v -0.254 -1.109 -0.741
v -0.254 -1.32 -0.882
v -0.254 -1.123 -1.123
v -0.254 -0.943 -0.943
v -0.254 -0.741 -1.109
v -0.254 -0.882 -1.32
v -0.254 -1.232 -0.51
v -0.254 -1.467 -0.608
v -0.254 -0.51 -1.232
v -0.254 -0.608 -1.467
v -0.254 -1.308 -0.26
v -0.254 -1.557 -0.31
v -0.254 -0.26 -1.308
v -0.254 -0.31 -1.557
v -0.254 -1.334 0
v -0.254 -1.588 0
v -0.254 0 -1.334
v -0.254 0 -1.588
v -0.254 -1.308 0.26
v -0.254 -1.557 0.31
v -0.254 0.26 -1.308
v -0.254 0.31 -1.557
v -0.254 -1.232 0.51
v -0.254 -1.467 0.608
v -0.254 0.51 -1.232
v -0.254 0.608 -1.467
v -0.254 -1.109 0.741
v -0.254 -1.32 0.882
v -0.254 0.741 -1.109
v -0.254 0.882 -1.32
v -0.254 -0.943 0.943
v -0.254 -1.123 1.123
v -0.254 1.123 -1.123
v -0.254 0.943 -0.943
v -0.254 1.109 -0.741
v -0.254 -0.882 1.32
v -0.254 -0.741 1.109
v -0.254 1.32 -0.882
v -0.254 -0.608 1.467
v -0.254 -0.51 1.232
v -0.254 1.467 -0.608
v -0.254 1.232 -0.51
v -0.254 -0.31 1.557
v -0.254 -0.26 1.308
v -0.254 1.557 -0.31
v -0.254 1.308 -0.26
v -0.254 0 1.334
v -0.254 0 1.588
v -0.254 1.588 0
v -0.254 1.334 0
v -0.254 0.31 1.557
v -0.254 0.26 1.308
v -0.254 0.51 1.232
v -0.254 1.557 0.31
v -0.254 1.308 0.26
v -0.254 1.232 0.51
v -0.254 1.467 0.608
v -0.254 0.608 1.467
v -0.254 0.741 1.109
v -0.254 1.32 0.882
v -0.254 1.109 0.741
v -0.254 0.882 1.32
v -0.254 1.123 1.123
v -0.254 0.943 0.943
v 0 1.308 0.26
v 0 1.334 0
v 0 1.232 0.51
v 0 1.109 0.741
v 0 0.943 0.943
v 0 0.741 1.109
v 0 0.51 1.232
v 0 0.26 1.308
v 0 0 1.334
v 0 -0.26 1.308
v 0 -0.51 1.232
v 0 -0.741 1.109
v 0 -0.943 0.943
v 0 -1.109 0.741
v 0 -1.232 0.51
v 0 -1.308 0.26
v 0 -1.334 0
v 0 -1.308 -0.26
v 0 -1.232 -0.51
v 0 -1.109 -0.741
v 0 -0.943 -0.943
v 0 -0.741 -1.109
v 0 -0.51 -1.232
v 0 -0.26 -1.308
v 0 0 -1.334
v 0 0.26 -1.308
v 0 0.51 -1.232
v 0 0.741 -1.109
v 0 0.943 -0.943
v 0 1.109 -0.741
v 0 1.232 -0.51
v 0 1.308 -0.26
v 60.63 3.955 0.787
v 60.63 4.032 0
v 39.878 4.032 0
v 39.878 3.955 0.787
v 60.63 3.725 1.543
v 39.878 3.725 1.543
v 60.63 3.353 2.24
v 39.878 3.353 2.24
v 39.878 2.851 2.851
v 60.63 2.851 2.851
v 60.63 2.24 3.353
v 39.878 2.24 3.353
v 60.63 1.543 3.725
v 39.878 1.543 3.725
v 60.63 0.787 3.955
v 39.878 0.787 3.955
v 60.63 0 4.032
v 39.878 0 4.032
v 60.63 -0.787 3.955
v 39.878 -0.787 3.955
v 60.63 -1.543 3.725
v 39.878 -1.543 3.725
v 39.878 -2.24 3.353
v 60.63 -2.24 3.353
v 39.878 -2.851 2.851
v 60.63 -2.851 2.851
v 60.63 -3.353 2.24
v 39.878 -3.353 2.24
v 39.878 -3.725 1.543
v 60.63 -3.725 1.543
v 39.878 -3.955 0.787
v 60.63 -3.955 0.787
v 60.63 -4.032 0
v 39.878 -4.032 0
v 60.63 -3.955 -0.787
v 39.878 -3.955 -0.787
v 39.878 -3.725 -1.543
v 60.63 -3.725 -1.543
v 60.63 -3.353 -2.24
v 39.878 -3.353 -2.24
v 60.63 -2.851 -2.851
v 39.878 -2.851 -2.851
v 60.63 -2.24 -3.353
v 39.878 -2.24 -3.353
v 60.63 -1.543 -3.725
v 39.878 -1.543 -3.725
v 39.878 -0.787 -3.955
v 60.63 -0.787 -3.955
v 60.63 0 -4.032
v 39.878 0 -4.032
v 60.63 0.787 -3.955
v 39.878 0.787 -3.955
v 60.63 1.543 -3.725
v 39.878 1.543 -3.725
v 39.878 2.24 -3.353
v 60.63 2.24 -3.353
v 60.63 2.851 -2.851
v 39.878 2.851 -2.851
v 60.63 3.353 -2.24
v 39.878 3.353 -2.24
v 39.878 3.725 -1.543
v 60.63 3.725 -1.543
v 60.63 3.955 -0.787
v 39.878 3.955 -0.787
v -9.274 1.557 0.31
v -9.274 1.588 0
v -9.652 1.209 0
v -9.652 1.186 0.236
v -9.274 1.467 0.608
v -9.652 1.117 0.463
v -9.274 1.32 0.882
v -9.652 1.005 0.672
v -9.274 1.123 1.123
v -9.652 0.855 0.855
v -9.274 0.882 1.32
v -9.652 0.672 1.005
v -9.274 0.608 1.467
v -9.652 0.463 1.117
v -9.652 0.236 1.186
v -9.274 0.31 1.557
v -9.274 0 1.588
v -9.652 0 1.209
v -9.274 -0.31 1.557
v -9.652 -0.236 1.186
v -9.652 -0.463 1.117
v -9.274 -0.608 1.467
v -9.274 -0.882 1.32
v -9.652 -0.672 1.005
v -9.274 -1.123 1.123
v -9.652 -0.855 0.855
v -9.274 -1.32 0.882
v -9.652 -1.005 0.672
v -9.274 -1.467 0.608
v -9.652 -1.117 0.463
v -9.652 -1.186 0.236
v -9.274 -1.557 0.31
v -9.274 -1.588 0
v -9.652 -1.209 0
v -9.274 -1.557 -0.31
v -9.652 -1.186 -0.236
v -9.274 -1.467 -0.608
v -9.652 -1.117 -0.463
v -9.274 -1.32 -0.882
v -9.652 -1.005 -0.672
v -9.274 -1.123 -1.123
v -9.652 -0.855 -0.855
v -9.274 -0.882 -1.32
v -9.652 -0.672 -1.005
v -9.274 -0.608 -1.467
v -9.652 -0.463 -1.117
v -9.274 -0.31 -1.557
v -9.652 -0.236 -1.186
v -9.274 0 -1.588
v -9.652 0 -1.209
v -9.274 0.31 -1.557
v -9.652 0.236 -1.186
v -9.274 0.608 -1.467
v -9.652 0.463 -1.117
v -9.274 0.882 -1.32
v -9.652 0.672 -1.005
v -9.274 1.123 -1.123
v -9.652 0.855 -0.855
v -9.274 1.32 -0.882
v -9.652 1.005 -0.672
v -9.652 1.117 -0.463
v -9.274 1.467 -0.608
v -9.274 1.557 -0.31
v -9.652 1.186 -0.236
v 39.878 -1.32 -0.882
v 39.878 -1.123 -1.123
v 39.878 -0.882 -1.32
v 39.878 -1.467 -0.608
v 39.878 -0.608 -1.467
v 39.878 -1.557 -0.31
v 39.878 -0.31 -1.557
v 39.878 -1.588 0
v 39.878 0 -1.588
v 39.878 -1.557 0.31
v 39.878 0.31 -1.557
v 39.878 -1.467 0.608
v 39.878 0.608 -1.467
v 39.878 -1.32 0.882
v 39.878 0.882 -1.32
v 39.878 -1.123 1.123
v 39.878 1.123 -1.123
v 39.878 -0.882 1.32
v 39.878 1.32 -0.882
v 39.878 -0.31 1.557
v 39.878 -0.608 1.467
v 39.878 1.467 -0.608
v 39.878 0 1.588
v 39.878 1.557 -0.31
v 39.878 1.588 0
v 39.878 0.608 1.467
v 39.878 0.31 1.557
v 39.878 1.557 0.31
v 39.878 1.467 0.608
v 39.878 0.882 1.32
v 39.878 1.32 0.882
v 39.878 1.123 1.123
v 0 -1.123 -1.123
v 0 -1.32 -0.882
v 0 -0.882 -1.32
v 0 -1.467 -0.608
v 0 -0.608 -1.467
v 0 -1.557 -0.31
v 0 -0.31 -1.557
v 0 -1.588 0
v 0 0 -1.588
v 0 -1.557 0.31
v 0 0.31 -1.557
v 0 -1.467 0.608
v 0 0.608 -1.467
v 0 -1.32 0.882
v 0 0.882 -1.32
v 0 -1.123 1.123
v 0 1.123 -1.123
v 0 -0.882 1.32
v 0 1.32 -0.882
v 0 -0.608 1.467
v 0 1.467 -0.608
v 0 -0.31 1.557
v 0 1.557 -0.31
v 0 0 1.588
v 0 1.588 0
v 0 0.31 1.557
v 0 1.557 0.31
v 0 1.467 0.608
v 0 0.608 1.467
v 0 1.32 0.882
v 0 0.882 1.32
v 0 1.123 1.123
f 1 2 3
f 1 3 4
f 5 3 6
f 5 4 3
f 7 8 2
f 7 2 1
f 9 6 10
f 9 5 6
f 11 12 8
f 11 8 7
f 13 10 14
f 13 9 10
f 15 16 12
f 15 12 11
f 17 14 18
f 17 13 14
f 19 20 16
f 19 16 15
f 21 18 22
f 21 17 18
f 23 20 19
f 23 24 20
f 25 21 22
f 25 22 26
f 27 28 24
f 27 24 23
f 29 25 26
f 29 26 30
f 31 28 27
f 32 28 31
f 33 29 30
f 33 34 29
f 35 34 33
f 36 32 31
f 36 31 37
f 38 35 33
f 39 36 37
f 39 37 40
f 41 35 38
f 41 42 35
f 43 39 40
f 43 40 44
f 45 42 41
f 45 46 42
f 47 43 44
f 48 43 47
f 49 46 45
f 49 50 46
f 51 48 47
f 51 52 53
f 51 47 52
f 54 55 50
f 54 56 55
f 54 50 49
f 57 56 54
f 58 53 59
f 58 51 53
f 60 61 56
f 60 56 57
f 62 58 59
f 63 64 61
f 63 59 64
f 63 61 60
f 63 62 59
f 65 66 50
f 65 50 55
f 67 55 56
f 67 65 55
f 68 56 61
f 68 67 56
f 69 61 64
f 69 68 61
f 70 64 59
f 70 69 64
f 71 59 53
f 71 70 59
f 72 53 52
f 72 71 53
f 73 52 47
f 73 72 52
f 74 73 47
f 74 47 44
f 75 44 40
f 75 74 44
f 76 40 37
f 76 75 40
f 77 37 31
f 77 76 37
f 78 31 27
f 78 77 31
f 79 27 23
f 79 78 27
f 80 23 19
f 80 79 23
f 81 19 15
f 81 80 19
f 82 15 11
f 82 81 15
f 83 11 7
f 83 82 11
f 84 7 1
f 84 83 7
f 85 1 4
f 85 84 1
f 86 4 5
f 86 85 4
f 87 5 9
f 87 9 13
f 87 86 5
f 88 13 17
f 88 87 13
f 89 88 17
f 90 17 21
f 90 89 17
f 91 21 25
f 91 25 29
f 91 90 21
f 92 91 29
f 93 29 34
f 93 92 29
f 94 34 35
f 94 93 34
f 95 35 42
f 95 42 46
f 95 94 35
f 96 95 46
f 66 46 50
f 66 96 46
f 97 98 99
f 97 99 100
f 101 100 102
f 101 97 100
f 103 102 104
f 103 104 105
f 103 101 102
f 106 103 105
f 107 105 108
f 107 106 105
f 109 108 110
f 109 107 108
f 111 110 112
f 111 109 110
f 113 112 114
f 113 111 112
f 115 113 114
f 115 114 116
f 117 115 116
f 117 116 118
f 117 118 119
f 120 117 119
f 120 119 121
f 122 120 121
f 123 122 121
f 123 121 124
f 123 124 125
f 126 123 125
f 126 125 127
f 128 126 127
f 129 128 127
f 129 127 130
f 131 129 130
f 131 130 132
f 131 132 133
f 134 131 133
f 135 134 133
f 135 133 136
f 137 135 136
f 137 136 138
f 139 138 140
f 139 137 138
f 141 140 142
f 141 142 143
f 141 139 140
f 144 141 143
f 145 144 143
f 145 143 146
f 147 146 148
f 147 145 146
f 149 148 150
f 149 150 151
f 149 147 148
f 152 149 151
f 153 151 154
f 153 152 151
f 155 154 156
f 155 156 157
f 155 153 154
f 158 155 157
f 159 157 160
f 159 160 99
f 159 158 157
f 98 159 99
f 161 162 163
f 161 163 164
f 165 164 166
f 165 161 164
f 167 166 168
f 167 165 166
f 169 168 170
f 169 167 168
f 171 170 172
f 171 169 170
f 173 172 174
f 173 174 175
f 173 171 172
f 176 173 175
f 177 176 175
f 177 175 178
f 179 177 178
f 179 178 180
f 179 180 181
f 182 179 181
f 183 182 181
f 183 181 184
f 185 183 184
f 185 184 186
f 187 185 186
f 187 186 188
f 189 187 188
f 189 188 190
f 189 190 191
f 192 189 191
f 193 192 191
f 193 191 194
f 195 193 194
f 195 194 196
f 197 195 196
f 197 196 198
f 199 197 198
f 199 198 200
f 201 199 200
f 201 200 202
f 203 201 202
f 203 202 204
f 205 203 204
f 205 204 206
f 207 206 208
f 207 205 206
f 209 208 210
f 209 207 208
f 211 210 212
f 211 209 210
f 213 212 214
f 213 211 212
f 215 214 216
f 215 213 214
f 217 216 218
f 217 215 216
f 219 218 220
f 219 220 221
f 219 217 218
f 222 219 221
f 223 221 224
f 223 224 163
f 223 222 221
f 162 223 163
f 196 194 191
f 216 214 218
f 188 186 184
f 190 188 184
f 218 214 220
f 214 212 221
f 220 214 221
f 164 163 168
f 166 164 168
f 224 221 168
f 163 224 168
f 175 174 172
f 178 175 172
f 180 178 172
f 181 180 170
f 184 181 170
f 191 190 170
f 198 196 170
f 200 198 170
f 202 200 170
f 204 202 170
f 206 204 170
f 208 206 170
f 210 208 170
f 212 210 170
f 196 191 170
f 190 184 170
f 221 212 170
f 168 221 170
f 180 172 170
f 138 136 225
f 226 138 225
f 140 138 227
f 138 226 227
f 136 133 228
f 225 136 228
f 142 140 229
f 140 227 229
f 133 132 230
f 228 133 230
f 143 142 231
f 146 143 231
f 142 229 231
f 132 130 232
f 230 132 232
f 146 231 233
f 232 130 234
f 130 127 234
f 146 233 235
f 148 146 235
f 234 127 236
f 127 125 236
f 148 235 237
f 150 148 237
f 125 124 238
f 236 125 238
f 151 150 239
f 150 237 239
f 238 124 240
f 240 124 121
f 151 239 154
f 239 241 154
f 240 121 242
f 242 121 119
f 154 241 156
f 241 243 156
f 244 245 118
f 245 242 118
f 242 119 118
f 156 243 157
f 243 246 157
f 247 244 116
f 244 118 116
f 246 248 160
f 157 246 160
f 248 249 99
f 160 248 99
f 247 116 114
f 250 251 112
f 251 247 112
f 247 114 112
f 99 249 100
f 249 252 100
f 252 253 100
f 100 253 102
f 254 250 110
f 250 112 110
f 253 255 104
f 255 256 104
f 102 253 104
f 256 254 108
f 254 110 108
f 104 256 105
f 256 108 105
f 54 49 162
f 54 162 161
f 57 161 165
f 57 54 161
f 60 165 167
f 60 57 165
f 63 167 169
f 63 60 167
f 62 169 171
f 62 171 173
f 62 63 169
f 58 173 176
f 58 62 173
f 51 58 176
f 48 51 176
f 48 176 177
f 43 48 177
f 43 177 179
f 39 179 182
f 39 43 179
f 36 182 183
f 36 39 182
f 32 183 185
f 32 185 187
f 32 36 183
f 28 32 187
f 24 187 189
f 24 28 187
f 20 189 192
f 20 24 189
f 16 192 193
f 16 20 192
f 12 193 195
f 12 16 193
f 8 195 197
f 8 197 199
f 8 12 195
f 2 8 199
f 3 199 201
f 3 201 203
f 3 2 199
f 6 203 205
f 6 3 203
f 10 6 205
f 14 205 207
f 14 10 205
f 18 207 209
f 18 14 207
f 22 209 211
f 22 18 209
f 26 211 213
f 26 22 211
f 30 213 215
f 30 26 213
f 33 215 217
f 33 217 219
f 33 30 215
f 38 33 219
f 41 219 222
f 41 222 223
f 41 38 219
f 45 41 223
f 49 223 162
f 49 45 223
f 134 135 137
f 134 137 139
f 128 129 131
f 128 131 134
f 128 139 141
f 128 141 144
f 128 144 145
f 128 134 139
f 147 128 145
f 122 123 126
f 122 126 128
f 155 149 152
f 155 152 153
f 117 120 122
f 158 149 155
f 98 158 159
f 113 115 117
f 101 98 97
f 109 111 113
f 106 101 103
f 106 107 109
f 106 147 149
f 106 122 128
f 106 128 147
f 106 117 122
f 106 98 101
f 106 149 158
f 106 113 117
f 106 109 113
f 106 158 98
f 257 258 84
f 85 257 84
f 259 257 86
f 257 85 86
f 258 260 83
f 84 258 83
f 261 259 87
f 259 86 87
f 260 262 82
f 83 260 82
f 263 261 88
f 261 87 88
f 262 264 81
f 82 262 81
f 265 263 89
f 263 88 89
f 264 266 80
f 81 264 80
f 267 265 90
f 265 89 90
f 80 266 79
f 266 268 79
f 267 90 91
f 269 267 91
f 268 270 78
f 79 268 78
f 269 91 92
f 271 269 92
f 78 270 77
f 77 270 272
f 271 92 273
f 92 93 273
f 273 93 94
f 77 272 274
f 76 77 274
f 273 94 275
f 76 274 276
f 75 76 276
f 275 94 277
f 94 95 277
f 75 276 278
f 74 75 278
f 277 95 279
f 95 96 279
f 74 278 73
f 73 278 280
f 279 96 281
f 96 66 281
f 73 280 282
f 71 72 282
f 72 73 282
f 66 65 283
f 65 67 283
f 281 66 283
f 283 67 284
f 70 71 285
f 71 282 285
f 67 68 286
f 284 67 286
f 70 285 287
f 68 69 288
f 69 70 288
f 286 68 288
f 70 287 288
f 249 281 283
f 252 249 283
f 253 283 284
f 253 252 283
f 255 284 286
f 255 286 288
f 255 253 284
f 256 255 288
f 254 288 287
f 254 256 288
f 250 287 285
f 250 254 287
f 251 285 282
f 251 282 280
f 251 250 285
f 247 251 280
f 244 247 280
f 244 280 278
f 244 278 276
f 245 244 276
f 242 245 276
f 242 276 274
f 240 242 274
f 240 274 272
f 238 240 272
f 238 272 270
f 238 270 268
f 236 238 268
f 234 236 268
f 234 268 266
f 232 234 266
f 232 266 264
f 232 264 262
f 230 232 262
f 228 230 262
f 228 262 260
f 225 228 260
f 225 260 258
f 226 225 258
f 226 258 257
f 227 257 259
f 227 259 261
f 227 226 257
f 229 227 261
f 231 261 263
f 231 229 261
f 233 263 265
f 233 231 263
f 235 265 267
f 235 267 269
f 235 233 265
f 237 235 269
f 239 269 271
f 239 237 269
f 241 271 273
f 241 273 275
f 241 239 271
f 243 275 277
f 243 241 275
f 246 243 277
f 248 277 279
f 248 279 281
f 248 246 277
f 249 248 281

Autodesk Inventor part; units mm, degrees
sketch "Sketch_1" plane through (0, 0, 0) normal (0, 0, 1) x (1, 0, 0)
  line L0 (60.6298, 0) -> (0, 0)
  line L1 (0, 0) -> (0, 1.5875)
  line L2 (0, 1.5875) -> (39.878, 1.5875)
  line L3 (39.878, 1.5875) -> (39.878, 4.0323)
  line L4 (39.878, 4.0323) -> (60.6298, 4.0323)
  line L5 (60.6298, 4.0323) -> (60.6298, 0)
  line L6 (60.6298, 0) -> (0, 0)
revolve "Revolution1" add sketch "Sketch_1" angle 360 about axis through (60.6298, 0, 0) along (1, 0, 0)
sketch "Sketch_2" plane through (0, 0, 0) normal (0, 0, 1) x (1, 0, 0)
  line L0 (0, 0) -> (-9.652, 0)
  line L1 (-9.652, 0) -> (-9.652, 1.209)
  line L2 (-9.652, 1.209) -> (-9.2735, 1.5875)
  line L3 (-9.2735, 1.5875) -> (0, 1.5875)
  line L4 (0, 1.5875) -> (0, 0)
  line L5 (0, 0) -> (-9.652, 0)
revolve "Revolution2" add sketch "Sketch_2" angle 360 about axis through (0, 0, 0) along (1, 0, 0)
sketch "Sketch_30" plane through (0, 0, 0) normal (0, 0, 1) x (1, 0, 0)
  line L0 (0, 0) -> (-0.254, 0)
  line L1 (-0.254, 1.3335) -> (0, 1.3335)
  line L2 (0, 1.3335) -> (0, 1.8415)
  line L3 (0, 1.8415) -> (-0.254, 1.8415)
  line L4 (-0.254, 1.8415) -> (-0.254, 1.3335)
revolve "Revolution3" cut sketch "Sketch_30" angle 360 about axis through (0, 0, 0) along (1, 0, 0)
ref_plane "dia1_XY" through (0, 1.5875, 0) normal (1, 0, 0) x (0, 0, -1)
ref_plane "dia1_YZ" through (0, 1.5875, 0) normal (0, 0, -1) x (0, 1, 0)
ref_plane "dia1_ZX" through (0, 1.5875, 0) normal (0, 1, 0) x (1, 0, 0)
ref_plane "dia12_XY" through (0, 0, 7.6835) normal (1, 0, 0) x (0, 0, -1)
ref_plane "dia12_YZ" through (0, 0, 7.6835) normal (0, 0, -1) x (0, 1, 0)
ref_plane "dia12_ZX" through (0, 0, 7.6835) normal (0, 1, 0) x (1, 0, 0)
ref_plane "dia1r_XY" through (0, 0, 4.5593) normal (1, 0, 0) x (0, 0, -1)
ref_plane "dia1r_YZ" through (0, 0, 4.5593) normal (0, 0, -1) x (0, 1, 0)
ref_plane "dia1r_ZX" through (0, 0, 4.5593) normal (0, 1, 0) x (1, 0, 0)
ref_plane "dia2_XY" through (0, -1.5875, 0) normal (1, 0, 0) x (0, 0, -1)
ref_plane "dia2_YZ" through (0, -1.5875, 0) normal (0, 0, -1) x (0, 1, 0)
ref_plane "dia2_ZX" through (0, -1.5875, 0) normal (0, 1, 0) x (1, 0, 0)
ref_plane "dia22_XY" through (0, 0, -7.6835) normal (1, 0, 0) x (0, 0, -1)
ref_plane "dia22_YZ" through (0, 0, -7.6835) normal (0, 0, -1) x (0, 1, 0)
ref_plane "dia22_ZX" through (0, 0, -7.6835) normal (0, 1, 0) x (1, 0, 0)
ref_plane "dia2r_XY" through (0, 0, -4.5593) normal (1, 0, 0) x (0, 0, -1)
ref_plane "dia2r_YZ" through (0, 0, -4.5593) normal (0, 0, -1) x (0, 1, 0)
ref_plane "dia2r_ZX" through (0, 0, -4.5593) normal (0, 1, 0) x (1, 0, 0)
ref_plane "rl1_XY" through (-9.652, 0, 0) normal (1, 0, 0) x (0, 0, -1)
ref_plane "rl1_YZ" through (-9.652, 0, 0) normal (0, 0, -1) x (0, 1, 0)
ref_plane "rl1_ZX" through (-9.652, 0, 0) normal (0, 1, 0) x (1, 0, 0)
ref_plane "rl2_XY" through (0, 0, 0) normal (1, 0, 0) x (0, 0, -1)
ref_plane "rl2_YZ" through (0, 0, 0) normal (0, 0, -1) x (0, 1, 0)
ref_plane "rl2_ZX" through (0, 0, 0) normal (0, 1, 0) x (1, 0, 0)
ref_plane "rod_cp_XY" through (0, 0, 0) normal (1, 0, 0) x (0, 0, -1)
ref_plane "rod_cp_YZ" through (0, 0, 0) normal (0, 0, -1) x (0, 1, 0)
ref_plane "rod_cp_ZX" through (0, 0, 0) normal (0, 1, 0) x (1, 0, 0)
ref_plane "stroke1_XY" through (0, 0, 0) normal (1, 0, 0) x (0, 0, -1)
ref_plane "stroke1_YZ" through (0, 0, 0) normal (0, 0, -1) x (0, 1, 0)
ref_plane "stroke1_ZX" through (0, 0, 0) normal (0, 1, 0) x (1, 0, 0)
ref_plane "thd1_XY" through (-9.652, 1.5875, 0) normal (1, 0, 0) x (0, 0, -1)
ref_plane "thd1_YZ" through (-9.652, 1.5875, 0) normal (0, 0, -1) x (0, 1, 0)
ref_plane "thd1_ZX" through (-9.652, 1.5875, 0) normal (0, 1, 0) x (1, 0, 0)
ref_plane "thd2_XY" through (-9.652, -1.5875, 0) normal (1, 0, 0) x (0, 0, -1)
ref_plane "thd2_YZ" through (-9.652, -1.5875, 0) normal (0, 0, -1) x (0, 1, 0)
ref_plane "thd2_ZX" through (-9.652, -1.5875, 0) normal (0, 1, 0) x (1, 0, 0)
ref_plane "to_rod_clevis_XY" through (-9.652, 0, 0) normal (1, 0, 0) x (0, 0, -1)
ref_plane "to_rod_clevis_YZ" through (-9.652, 0, 0) normal (0, 0, -1) x (0, 1, 0)
ref_plane "to_rod_clevis_ZX" through (-9.652, 0, 0) normal (0, 1, 0) x (1, 0, 0)
properties part number "0070.725-R0000_rod"
